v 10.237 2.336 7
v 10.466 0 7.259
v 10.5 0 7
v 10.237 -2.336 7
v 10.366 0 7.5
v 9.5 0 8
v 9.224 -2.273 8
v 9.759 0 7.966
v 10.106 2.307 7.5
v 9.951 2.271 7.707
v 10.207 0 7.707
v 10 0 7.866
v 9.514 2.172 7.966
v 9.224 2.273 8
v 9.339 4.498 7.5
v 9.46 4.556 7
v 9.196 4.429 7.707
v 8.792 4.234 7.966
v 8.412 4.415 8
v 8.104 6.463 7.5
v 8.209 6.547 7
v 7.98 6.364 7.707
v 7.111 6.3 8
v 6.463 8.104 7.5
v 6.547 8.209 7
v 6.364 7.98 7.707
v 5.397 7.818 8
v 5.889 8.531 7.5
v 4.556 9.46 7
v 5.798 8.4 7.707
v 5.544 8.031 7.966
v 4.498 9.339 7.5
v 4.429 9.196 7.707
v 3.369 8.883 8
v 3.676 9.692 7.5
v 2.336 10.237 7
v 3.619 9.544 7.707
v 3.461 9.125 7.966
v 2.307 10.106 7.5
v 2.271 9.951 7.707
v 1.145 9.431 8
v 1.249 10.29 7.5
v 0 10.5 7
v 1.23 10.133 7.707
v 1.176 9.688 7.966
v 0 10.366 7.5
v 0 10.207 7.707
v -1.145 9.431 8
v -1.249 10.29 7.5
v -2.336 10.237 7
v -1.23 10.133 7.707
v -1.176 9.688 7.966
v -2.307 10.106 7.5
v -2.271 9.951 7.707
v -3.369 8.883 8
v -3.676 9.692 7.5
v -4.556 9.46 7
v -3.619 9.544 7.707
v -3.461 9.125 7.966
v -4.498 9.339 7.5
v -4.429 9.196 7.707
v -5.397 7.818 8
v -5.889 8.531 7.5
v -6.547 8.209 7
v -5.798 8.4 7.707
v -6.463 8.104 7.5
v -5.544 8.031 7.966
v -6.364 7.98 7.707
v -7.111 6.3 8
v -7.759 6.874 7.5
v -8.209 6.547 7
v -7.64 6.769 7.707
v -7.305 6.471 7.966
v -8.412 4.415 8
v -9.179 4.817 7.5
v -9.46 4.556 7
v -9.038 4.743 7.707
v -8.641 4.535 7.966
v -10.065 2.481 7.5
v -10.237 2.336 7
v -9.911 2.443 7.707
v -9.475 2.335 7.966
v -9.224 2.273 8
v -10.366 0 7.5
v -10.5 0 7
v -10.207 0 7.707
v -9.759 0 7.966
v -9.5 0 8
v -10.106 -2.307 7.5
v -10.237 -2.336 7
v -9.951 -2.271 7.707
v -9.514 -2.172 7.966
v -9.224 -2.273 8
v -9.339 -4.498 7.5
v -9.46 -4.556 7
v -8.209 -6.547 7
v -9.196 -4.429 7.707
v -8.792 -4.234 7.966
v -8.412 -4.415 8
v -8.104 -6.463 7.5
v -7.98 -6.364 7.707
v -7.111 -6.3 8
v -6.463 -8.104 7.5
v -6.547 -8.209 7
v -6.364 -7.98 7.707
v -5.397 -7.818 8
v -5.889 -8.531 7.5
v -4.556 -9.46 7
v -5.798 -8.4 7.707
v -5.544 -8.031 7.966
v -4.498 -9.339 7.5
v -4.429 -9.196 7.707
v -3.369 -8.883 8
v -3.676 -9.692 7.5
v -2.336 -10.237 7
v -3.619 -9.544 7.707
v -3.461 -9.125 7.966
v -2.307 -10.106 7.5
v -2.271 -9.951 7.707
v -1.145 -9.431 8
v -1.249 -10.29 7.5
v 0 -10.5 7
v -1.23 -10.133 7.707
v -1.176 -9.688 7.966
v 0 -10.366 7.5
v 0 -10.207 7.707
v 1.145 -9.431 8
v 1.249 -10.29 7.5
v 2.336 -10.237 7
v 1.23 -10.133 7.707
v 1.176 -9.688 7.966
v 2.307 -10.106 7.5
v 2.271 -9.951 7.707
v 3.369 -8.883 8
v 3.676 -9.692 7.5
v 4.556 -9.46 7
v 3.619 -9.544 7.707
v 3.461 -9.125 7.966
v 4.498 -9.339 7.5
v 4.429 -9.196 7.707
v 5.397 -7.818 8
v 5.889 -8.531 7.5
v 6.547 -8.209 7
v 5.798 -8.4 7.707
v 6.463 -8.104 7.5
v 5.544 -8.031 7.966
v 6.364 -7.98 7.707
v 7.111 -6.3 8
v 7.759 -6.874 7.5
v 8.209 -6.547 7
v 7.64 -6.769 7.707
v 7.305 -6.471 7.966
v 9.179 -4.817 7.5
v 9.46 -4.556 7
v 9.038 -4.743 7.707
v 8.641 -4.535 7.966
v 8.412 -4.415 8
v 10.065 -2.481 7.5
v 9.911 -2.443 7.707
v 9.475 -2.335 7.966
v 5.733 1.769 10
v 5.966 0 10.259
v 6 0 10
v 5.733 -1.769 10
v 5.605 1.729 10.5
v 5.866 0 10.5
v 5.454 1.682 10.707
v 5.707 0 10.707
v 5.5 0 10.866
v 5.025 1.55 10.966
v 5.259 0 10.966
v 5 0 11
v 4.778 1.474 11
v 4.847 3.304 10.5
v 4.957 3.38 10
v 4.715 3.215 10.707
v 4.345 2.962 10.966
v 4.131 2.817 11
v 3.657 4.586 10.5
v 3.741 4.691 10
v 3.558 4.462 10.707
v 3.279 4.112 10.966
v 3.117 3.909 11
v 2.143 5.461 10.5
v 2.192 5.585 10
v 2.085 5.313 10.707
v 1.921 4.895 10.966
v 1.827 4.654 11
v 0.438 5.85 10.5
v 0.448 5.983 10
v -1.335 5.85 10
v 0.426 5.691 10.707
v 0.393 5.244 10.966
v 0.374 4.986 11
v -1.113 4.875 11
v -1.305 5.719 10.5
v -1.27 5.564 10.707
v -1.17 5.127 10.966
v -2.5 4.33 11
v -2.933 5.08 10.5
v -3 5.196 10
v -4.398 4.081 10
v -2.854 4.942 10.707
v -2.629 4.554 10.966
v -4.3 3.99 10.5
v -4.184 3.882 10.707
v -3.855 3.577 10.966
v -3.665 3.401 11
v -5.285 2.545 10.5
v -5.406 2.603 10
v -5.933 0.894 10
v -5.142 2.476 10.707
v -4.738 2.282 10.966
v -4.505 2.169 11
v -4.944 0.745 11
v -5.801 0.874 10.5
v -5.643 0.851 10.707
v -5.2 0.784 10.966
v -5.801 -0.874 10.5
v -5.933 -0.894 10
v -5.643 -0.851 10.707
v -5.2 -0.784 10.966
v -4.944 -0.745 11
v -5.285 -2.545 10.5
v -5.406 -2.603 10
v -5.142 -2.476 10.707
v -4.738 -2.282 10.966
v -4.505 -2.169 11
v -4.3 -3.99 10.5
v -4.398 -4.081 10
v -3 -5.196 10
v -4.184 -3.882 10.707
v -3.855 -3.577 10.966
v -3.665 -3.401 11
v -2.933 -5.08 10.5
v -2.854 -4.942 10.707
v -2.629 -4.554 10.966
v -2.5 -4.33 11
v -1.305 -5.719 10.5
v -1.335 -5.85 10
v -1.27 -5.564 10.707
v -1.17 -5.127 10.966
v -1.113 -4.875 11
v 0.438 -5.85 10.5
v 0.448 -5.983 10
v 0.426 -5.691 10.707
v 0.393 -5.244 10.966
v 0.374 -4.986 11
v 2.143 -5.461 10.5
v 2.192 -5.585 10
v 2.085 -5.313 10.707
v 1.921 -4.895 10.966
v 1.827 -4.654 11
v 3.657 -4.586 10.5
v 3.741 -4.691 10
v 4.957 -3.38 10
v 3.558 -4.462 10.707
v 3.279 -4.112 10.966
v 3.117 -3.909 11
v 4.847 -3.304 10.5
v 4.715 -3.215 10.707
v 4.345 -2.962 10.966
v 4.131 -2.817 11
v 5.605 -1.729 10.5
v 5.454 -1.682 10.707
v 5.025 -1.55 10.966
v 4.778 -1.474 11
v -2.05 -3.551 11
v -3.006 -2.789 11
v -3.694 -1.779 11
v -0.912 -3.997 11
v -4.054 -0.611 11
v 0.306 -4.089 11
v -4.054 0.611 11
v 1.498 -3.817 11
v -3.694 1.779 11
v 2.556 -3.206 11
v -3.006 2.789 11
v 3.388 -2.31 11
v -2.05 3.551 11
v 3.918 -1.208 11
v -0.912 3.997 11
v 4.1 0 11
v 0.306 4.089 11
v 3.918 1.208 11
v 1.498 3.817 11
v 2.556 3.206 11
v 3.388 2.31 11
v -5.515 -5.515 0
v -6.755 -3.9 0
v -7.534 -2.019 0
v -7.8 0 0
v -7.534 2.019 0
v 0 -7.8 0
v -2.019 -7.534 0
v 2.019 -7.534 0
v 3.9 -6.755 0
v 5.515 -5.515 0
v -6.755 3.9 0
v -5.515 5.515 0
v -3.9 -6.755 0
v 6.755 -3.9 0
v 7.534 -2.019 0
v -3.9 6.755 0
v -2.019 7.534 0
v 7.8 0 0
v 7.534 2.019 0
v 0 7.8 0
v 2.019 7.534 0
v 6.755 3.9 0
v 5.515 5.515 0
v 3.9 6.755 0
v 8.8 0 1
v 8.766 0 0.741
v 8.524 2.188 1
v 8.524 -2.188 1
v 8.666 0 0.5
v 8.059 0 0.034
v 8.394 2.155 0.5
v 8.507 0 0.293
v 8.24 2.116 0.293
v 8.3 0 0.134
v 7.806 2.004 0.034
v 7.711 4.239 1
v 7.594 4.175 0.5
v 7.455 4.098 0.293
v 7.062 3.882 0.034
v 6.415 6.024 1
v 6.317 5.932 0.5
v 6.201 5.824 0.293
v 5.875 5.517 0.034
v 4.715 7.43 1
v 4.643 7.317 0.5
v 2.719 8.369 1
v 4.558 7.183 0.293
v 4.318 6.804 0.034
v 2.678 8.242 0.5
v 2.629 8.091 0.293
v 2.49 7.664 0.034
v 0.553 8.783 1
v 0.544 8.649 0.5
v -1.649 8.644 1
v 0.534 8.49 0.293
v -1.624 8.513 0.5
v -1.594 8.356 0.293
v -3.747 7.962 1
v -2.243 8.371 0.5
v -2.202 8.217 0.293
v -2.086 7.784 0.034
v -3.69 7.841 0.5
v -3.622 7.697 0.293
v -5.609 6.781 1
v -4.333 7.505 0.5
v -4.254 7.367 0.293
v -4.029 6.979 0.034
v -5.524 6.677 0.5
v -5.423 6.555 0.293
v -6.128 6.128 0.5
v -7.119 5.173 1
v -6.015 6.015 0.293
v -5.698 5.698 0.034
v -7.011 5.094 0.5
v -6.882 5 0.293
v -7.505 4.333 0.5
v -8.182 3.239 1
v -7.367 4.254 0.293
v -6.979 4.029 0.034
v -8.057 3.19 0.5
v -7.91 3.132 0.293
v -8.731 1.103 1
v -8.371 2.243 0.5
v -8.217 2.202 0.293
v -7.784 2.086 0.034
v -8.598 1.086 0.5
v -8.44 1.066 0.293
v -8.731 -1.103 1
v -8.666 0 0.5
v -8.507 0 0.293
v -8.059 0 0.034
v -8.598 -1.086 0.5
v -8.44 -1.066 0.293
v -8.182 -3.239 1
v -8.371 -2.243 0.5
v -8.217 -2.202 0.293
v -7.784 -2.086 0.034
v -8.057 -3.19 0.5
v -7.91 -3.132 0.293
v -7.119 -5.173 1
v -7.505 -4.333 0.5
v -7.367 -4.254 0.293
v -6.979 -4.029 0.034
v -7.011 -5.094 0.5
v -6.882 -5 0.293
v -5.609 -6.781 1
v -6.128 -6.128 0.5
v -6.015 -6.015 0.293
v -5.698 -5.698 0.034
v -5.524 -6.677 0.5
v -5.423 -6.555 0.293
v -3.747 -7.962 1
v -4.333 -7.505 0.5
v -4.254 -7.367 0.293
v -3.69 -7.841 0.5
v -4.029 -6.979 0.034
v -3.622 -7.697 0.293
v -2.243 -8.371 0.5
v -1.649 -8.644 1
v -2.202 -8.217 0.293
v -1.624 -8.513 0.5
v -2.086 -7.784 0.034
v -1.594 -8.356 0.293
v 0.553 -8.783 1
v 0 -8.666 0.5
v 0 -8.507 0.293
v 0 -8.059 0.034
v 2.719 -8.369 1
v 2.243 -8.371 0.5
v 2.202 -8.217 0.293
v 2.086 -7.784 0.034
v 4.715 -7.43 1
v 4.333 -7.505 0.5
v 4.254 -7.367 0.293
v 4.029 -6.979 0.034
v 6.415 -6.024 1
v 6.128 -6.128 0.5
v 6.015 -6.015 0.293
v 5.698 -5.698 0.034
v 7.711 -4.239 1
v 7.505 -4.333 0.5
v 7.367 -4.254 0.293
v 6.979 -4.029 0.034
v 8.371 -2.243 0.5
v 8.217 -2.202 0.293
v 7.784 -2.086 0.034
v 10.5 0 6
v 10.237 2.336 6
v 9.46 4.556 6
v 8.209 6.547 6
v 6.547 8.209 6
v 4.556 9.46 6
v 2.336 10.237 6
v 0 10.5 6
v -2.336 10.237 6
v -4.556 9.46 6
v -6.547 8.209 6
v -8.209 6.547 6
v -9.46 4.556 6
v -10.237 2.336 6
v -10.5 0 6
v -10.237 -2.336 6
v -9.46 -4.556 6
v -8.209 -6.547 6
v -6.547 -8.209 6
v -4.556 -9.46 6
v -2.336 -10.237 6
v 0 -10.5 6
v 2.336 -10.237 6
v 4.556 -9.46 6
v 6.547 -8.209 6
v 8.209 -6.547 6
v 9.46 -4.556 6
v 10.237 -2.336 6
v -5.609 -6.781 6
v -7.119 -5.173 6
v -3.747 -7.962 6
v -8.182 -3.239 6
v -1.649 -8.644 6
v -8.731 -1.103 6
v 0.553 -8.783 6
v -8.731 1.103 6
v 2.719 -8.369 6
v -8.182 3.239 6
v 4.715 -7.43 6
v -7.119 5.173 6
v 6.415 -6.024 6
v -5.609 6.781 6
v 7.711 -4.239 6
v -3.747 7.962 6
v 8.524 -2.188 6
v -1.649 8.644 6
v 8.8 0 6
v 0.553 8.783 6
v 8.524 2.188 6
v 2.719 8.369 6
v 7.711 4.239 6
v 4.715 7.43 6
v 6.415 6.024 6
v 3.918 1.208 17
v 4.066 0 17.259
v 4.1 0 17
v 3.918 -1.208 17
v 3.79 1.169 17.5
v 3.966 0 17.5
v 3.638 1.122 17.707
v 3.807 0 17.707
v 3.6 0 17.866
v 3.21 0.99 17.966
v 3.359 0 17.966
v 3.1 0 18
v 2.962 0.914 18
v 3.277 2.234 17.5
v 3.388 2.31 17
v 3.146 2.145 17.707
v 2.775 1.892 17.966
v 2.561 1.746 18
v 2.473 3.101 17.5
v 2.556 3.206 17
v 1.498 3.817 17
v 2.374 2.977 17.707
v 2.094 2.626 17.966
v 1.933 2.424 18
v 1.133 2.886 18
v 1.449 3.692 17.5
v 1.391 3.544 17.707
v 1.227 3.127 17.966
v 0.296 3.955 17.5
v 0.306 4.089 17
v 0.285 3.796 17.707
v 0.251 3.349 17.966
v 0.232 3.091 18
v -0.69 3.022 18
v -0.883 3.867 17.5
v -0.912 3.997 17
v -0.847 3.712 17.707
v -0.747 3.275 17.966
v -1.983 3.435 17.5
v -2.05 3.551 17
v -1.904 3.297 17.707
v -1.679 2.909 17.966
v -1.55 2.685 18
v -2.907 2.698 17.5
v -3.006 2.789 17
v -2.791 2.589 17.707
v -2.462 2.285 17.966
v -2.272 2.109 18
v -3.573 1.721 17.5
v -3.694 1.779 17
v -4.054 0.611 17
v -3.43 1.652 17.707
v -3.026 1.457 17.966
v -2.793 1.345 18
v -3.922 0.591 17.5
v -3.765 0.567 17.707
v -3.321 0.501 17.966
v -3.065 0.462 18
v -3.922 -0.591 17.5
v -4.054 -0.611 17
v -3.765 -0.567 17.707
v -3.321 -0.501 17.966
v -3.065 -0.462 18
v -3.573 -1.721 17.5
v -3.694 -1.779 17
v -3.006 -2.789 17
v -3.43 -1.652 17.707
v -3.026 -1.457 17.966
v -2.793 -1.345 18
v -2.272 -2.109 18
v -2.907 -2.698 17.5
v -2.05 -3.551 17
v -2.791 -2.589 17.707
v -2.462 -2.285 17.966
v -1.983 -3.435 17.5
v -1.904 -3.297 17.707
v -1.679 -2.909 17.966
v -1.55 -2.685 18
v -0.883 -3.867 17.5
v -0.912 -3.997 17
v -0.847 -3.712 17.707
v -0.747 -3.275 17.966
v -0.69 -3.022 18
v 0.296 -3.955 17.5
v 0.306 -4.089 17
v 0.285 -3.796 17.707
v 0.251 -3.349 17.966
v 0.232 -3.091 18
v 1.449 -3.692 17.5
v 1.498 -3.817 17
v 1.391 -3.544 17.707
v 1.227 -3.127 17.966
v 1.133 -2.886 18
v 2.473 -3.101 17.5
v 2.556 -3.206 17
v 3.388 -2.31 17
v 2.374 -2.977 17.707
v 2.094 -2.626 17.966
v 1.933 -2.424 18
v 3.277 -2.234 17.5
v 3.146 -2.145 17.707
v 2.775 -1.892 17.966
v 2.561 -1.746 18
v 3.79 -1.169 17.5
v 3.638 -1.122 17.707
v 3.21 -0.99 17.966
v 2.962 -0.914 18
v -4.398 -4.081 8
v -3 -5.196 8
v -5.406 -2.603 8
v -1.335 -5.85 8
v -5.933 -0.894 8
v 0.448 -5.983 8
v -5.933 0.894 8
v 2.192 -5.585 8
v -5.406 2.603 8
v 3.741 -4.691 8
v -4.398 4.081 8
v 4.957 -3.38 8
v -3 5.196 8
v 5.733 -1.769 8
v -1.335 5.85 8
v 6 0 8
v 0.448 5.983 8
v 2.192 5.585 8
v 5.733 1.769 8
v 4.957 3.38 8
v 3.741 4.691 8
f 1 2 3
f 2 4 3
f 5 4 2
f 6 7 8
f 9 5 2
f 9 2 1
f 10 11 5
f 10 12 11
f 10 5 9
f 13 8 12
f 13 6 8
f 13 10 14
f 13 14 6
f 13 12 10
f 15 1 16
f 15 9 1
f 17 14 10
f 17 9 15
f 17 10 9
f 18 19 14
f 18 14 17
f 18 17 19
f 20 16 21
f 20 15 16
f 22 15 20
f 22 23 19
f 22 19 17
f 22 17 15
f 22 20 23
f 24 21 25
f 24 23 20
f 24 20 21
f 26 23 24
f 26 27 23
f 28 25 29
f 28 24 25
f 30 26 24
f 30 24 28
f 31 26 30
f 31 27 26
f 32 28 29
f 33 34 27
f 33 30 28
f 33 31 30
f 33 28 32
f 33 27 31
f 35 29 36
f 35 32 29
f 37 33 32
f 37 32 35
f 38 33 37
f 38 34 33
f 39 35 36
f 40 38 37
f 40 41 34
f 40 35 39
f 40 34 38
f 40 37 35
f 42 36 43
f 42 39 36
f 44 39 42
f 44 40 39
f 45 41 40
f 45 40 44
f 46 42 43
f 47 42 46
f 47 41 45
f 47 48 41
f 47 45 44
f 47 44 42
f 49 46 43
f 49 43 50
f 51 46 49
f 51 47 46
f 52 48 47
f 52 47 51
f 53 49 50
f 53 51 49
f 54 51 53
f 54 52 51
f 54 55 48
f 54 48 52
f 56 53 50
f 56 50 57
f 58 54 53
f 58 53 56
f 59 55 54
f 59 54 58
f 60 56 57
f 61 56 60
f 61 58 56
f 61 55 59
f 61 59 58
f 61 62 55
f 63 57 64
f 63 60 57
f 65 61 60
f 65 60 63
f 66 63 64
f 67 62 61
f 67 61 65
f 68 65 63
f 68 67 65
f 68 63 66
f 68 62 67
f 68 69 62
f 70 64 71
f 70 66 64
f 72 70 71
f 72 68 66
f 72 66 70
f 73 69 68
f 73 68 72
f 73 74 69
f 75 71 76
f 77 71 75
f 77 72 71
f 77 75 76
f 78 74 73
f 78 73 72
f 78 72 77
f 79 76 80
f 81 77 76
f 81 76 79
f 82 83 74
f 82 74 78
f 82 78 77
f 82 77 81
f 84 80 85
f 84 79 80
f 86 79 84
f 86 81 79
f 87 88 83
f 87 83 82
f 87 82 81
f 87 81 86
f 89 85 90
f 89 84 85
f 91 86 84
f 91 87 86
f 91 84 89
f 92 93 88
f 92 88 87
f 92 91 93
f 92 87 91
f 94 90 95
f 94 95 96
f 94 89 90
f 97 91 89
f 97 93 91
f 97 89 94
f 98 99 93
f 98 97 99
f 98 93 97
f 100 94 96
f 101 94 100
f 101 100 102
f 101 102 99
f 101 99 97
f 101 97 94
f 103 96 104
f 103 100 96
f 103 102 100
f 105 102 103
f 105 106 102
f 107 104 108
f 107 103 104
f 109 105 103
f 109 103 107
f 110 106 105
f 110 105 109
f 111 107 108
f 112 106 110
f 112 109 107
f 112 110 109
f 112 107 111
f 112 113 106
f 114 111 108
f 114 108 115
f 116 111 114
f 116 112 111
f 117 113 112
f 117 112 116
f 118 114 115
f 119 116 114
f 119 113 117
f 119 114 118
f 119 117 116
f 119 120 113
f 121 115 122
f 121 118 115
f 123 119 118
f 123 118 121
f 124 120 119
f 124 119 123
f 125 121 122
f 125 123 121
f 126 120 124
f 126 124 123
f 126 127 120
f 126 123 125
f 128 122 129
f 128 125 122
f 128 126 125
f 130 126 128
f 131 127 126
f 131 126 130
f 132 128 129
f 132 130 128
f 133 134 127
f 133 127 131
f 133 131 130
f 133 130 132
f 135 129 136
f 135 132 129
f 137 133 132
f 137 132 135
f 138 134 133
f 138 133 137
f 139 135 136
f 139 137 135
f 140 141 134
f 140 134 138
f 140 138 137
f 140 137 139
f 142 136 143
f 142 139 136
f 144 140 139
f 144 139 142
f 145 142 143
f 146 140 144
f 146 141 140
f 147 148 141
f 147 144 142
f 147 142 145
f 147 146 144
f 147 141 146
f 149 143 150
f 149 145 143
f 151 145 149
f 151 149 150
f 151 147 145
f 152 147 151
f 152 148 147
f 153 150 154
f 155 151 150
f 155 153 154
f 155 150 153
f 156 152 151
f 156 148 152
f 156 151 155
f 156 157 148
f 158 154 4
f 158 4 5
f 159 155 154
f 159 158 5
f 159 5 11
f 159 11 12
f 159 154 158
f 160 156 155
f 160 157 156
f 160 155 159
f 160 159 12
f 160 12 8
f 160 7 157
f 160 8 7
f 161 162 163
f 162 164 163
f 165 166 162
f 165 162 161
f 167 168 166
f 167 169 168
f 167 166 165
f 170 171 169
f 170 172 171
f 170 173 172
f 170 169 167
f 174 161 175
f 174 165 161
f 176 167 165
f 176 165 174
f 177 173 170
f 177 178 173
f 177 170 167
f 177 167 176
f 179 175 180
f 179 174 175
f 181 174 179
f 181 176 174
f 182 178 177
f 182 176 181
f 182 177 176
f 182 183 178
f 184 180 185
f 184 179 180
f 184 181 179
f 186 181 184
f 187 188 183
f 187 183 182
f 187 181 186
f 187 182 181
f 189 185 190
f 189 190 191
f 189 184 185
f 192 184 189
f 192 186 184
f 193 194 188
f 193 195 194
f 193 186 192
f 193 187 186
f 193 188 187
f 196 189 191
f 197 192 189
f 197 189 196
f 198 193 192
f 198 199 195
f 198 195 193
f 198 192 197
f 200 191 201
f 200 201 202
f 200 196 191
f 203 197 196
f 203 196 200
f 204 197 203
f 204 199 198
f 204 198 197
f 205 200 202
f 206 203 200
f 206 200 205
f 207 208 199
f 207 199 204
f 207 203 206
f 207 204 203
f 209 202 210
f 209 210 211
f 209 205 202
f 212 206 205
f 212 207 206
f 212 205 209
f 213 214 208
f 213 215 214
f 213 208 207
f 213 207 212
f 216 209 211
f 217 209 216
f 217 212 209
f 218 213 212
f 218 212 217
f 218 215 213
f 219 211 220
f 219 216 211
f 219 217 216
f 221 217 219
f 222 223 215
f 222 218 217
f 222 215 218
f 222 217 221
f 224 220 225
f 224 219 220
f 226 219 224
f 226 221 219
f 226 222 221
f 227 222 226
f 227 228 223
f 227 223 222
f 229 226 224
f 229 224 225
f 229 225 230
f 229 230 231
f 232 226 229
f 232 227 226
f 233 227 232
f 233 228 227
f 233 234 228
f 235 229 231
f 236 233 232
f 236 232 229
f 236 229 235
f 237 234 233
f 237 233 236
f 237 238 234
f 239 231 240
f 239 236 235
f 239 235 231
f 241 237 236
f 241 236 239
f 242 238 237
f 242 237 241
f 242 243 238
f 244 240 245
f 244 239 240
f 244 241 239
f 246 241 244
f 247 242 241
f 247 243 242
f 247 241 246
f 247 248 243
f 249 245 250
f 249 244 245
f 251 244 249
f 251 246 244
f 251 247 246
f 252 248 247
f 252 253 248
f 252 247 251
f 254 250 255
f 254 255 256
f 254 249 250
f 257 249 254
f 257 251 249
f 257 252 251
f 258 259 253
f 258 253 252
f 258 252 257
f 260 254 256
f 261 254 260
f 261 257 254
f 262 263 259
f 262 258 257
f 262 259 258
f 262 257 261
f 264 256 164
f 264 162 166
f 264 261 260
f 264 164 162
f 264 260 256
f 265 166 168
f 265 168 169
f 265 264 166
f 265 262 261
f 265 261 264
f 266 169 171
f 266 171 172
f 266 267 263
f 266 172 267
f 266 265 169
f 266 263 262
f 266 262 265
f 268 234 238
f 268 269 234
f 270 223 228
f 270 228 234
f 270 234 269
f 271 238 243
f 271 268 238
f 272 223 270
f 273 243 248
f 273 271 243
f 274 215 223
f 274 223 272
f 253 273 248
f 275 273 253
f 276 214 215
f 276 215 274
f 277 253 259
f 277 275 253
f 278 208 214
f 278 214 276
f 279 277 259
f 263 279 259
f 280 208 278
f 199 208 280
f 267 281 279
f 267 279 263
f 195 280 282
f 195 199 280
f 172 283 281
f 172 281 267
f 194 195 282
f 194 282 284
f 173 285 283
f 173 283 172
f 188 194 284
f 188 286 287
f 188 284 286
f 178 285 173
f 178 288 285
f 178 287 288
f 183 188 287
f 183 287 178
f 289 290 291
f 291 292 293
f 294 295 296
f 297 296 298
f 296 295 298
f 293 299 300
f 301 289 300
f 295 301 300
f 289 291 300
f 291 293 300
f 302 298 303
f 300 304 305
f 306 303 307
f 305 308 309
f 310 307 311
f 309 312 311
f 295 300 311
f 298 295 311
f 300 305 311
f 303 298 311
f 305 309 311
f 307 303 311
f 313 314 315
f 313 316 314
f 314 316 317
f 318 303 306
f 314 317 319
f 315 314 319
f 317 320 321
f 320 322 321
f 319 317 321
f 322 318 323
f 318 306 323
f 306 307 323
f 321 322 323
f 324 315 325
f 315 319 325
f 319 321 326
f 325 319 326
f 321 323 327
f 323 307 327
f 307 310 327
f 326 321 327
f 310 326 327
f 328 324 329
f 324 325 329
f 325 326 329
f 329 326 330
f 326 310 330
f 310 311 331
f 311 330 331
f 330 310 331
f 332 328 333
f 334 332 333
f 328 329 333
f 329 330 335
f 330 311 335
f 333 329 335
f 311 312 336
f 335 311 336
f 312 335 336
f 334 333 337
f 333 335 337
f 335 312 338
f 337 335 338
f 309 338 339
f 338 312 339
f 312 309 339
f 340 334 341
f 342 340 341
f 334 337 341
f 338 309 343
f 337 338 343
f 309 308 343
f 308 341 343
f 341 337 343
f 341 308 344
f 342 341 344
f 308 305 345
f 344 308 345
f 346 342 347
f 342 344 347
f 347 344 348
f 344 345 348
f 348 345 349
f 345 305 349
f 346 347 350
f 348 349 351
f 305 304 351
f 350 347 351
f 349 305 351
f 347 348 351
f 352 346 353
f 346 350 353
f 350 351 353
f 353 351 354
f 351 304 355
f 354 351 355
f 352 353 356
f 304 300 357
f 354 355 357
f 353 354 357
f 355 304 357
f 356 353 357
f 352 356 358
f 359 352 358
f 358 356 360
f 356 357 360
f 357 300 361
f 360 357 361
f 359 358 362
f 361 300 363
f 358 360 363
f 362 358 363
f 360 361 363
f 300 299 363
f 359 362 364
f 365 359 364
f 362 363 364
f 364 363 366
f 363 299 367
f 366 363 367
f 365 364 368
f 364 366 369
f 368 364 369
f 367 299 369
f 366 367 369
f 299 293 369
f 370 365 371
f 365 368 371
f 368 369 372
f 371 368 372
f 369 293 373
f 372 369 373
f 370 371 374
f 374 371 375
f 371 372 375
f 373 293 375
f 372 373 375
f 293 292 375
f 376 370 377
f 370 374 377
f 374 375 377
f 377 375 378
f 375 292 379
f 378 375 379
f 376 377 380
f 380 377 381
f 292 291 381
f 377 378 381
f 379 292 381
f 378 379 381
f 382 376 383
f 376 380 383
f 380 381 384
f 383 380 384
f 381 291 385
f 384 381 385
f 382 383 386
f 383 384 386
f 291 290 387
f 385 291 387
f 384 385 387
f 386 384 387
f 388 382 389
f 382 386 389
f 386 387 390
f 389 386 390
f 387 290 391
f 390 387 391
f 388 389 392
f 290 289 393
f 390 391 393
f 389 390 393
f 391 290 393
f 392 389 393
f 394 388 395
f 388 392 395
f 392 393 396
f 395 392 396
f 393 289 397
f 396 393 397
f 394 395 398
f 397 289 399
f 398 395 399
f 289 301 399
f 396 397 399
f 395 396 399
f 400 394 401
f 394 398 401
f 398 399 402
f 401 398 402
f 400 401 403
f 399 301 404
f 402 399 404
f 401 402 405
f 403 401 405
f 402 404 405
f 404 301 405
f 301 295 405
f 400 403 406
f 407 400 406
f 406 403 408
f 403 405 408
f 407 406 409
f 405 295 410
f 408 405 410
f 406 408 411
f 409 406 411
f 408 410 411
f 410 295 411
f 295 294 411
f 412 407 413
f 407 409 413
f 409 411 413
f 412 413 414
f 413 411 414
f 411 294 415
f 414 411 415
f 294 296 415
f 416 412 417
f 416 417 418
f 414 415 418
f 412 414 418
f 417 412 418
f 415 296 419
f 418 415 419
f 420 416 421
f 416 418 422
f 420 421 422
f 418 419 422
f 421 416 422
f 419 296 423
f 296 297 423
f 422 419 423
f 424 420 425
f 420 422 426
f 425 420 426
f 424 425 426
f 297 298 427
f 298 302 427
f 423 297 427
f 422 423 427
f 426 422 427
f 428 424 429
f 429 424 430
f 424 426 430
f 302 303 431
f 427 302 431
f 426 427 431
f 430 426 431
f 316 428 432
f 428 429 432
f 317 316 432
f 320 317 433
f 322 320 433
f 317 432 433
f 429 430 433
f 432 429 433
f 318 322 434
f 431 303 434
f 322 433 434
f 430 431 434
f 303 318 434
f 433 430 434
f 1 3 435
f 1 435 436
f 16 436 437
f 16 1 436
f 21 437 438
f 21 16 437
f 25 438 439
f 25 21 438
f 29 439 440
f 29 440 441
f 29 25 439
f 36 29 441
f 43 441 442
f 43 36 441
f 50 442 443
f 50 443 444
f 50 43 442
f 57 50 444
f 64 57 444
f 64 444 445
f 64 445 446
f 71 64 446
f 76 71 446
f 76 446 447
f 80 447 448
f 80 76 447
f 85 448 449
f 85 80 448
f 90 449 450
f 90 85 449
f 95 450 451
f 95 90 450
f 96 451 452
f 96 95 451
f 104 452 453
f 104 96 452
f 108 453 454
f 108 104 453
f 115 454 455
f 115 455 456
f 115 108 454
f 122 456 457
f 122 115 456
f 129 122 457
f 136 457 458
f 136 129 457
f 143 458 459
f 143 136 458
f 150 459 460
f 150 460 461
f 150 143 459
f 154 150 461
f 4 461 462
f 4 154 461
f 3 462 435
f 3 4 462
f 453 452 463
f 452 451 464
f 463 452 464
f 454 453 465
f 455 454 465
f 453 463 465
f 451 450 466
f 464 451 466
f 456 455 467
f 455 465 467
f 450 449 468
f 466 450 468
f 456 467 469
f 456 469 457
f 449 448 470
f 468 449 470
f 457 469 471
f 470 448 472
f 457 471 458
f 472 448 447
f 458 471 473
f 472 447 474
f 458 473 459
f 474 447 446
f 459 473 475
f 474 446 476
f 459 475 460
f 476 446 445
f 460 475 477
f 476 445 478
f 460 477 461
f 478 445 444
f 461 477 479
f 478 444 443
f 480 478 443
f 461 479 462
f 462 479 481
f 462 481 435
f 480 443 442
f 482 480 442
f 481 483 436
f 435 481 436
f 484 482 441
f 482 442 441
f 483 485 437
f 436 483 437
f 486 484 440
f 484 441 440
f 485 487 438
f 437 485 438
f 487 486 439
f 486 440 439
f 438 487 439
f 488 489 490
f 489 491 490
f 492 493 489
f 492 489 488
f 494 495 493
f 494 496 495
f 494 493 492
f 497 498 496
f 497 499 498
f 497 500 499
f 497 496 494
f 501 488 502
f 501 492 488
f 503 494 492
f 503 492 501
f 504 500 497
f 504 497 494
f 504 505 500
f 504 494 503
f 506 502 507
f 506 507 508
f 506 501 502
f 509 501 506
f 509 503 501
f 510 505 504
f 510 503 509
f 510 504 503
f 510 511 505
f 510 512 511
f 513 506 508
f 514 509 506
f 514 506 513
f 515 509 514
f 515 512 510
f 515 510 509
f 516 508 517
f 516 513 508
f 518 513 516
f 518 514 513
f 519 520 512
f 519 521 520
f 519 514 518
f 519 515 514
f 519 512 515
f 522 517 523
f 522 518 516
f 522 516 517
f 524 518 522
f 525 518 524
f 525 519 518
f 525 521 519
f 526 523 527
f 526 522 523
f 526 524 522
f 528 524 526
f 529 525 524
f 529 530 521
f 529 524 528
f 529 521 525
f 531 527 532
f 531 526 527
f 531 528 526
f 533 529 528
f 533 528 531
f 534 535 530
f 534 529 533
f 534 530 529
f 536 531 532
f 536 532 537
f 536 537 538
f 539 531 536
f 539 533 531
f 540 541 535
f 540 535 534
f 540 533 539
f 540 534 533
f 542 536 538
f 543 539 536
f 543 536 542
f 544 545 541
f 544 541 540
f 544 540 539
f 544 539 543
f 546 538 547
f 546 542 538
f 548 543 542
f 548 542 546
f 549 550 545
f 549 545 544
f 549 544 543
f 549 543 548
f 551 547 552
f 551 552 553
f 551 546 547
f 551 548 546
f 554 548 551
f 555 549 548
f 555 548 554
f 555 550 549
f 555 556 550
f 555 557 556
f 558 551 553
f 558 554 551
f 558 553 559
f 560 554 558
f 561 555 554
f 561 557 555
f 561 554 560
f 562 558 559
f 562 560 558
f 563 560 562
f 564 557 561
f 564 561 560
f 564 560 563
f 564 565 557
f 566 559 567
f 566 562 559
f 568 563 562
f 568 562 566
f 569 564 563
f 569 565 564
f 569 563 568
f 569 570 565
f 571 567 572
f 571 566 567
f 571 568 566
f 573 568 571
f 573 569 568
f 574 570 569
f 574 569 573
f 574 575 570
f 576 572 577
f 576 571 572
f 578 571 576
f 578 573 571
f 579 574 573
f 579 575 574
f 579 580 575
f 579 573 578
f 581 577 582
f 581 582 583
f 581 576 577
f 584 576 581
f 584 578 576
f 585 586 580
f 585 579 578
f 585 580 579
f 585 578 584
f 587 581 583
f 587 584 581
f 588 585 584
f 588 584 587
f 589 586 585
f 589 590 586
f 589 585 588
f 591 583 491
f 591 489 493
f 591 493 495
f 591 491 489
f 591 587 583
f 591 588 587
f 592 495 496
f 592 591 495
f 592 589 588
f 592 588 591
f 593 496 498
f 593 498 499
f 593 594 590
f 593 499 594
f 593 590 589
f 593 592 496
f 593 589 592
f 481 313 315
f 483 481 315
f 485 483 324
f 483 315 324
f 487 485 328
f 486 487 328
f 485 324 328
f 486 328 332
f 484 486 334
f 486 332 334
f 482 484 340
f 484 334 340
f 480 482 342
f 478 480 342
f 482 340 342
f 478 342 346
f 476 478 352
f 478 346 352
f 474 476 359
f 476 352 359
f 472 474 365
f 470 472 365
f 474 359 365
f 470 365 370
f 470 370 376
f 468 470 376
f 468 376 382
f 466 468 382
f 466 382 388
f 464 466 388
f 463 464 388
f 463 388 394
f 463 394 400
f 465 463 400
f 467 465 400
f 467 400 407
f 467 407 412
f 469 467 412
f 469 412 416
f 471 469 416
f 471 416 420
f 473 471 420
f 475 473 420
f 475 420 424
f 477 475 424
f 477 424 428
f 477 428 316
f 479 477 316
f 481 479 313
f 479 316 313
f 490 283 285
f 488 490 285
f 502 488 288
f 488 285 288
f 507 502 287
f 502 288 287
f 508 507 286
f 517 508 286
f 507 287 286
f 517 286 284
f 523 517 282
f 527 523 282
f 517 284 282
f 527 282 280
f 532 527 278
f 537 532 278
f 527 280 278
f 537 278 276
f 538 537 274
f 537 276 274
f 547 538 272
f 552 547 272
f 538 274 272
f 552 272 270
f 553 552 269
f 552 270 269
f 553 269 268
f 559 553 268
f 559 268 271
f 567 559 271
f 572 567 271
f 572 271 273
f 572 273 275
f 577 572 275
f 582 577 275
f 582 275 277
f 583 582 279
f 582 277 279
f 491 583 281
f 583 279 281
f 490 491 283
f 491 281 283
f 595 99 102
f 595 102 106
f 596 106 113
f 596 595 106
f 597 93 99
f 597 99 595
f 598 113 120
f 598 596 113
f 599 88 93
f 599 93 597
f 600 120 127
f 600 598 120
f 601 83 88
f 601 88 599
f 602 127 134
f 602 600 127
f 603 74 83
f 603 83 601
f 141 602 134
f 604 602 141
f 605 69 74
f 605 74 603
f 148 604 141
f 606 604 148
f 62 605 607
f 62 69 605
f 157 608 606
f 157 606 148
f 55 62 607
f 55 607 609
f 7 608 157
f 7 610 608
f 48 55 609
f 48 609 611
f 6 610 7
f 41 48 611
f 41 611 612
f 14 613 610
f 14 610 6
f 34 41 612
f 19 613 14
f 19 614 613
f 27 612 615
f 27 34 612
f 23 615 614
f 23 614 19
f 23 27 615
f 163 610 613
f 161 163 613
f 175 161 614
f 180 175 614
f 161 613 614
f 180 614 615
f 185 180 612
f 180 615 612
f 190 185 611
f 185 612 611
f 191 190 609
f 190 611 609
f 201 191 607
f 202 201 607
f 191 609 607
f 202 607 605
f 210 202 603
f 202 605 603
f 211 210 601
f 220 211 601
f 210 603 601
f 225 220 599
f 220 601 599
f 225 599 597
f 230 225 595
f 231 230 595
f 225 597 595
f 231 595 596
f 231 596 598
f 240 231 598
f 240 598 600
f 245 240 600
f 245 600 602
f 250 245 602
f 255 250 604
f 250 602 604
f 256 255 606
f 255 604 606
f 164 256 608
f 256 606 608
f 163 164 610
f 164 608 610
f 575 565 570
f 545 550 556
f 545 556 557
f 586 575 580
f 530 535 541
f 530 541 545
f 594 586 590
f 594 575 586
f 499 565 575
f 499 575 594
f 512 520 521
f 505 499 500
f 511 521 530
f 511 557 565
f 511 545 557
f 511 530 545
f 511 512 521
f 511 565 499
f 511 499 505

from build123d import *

# Parameters (mm, degrees)
F0_R     = 8.8
F1_DEPTH = 8
F2_R     = 6
F3_DEPTH = 3
F4_R     = 4.1
F5_DEPTH = 7
F6_R     = 10.5
F6_R_2   = 8.8
F7_DEPTH = 2
F8_R     = 1


with BuildPart() as f1:
    # F0 (on Top) → F1 (new body)
    with BuildSketch(Plane.XY):
        Circle(F0_R)
    extrude(amount=F1_DEPTH)

    # F2 (on face) → F3 (join)
    with BuildSketch(Plane.XY.offset(8)):
        Circle(F2_R)
    extrude(amount=F3_DEPTH)

    # F4 (on face) → F5 (join)
    with BuildSketch(Plane.XY.offset(11)):
        Circle(F4_R)
    extrude(amount=F5_DEPTH)

    # F6 (on face) → F7 (join)
    with BuildSketch(Plane.XY.offset(8)):
        Circle(F6_R)
        Circle(F6_R_2, mode=Mode.SUBTRACT)
    extrude(amount=-F7_DEPTH)

    # F8
    f8_edges = [f1.edges().sort_by_distance(p)[0] for p in [
        (-4.1, 0, 18),
        (-6, 0, 11),
        (-10.5, 0, 8),
        (-8.8, 0, 0),
    ]]
    fillet(f8_edges, radius=F8_R)


solid = f1.part
